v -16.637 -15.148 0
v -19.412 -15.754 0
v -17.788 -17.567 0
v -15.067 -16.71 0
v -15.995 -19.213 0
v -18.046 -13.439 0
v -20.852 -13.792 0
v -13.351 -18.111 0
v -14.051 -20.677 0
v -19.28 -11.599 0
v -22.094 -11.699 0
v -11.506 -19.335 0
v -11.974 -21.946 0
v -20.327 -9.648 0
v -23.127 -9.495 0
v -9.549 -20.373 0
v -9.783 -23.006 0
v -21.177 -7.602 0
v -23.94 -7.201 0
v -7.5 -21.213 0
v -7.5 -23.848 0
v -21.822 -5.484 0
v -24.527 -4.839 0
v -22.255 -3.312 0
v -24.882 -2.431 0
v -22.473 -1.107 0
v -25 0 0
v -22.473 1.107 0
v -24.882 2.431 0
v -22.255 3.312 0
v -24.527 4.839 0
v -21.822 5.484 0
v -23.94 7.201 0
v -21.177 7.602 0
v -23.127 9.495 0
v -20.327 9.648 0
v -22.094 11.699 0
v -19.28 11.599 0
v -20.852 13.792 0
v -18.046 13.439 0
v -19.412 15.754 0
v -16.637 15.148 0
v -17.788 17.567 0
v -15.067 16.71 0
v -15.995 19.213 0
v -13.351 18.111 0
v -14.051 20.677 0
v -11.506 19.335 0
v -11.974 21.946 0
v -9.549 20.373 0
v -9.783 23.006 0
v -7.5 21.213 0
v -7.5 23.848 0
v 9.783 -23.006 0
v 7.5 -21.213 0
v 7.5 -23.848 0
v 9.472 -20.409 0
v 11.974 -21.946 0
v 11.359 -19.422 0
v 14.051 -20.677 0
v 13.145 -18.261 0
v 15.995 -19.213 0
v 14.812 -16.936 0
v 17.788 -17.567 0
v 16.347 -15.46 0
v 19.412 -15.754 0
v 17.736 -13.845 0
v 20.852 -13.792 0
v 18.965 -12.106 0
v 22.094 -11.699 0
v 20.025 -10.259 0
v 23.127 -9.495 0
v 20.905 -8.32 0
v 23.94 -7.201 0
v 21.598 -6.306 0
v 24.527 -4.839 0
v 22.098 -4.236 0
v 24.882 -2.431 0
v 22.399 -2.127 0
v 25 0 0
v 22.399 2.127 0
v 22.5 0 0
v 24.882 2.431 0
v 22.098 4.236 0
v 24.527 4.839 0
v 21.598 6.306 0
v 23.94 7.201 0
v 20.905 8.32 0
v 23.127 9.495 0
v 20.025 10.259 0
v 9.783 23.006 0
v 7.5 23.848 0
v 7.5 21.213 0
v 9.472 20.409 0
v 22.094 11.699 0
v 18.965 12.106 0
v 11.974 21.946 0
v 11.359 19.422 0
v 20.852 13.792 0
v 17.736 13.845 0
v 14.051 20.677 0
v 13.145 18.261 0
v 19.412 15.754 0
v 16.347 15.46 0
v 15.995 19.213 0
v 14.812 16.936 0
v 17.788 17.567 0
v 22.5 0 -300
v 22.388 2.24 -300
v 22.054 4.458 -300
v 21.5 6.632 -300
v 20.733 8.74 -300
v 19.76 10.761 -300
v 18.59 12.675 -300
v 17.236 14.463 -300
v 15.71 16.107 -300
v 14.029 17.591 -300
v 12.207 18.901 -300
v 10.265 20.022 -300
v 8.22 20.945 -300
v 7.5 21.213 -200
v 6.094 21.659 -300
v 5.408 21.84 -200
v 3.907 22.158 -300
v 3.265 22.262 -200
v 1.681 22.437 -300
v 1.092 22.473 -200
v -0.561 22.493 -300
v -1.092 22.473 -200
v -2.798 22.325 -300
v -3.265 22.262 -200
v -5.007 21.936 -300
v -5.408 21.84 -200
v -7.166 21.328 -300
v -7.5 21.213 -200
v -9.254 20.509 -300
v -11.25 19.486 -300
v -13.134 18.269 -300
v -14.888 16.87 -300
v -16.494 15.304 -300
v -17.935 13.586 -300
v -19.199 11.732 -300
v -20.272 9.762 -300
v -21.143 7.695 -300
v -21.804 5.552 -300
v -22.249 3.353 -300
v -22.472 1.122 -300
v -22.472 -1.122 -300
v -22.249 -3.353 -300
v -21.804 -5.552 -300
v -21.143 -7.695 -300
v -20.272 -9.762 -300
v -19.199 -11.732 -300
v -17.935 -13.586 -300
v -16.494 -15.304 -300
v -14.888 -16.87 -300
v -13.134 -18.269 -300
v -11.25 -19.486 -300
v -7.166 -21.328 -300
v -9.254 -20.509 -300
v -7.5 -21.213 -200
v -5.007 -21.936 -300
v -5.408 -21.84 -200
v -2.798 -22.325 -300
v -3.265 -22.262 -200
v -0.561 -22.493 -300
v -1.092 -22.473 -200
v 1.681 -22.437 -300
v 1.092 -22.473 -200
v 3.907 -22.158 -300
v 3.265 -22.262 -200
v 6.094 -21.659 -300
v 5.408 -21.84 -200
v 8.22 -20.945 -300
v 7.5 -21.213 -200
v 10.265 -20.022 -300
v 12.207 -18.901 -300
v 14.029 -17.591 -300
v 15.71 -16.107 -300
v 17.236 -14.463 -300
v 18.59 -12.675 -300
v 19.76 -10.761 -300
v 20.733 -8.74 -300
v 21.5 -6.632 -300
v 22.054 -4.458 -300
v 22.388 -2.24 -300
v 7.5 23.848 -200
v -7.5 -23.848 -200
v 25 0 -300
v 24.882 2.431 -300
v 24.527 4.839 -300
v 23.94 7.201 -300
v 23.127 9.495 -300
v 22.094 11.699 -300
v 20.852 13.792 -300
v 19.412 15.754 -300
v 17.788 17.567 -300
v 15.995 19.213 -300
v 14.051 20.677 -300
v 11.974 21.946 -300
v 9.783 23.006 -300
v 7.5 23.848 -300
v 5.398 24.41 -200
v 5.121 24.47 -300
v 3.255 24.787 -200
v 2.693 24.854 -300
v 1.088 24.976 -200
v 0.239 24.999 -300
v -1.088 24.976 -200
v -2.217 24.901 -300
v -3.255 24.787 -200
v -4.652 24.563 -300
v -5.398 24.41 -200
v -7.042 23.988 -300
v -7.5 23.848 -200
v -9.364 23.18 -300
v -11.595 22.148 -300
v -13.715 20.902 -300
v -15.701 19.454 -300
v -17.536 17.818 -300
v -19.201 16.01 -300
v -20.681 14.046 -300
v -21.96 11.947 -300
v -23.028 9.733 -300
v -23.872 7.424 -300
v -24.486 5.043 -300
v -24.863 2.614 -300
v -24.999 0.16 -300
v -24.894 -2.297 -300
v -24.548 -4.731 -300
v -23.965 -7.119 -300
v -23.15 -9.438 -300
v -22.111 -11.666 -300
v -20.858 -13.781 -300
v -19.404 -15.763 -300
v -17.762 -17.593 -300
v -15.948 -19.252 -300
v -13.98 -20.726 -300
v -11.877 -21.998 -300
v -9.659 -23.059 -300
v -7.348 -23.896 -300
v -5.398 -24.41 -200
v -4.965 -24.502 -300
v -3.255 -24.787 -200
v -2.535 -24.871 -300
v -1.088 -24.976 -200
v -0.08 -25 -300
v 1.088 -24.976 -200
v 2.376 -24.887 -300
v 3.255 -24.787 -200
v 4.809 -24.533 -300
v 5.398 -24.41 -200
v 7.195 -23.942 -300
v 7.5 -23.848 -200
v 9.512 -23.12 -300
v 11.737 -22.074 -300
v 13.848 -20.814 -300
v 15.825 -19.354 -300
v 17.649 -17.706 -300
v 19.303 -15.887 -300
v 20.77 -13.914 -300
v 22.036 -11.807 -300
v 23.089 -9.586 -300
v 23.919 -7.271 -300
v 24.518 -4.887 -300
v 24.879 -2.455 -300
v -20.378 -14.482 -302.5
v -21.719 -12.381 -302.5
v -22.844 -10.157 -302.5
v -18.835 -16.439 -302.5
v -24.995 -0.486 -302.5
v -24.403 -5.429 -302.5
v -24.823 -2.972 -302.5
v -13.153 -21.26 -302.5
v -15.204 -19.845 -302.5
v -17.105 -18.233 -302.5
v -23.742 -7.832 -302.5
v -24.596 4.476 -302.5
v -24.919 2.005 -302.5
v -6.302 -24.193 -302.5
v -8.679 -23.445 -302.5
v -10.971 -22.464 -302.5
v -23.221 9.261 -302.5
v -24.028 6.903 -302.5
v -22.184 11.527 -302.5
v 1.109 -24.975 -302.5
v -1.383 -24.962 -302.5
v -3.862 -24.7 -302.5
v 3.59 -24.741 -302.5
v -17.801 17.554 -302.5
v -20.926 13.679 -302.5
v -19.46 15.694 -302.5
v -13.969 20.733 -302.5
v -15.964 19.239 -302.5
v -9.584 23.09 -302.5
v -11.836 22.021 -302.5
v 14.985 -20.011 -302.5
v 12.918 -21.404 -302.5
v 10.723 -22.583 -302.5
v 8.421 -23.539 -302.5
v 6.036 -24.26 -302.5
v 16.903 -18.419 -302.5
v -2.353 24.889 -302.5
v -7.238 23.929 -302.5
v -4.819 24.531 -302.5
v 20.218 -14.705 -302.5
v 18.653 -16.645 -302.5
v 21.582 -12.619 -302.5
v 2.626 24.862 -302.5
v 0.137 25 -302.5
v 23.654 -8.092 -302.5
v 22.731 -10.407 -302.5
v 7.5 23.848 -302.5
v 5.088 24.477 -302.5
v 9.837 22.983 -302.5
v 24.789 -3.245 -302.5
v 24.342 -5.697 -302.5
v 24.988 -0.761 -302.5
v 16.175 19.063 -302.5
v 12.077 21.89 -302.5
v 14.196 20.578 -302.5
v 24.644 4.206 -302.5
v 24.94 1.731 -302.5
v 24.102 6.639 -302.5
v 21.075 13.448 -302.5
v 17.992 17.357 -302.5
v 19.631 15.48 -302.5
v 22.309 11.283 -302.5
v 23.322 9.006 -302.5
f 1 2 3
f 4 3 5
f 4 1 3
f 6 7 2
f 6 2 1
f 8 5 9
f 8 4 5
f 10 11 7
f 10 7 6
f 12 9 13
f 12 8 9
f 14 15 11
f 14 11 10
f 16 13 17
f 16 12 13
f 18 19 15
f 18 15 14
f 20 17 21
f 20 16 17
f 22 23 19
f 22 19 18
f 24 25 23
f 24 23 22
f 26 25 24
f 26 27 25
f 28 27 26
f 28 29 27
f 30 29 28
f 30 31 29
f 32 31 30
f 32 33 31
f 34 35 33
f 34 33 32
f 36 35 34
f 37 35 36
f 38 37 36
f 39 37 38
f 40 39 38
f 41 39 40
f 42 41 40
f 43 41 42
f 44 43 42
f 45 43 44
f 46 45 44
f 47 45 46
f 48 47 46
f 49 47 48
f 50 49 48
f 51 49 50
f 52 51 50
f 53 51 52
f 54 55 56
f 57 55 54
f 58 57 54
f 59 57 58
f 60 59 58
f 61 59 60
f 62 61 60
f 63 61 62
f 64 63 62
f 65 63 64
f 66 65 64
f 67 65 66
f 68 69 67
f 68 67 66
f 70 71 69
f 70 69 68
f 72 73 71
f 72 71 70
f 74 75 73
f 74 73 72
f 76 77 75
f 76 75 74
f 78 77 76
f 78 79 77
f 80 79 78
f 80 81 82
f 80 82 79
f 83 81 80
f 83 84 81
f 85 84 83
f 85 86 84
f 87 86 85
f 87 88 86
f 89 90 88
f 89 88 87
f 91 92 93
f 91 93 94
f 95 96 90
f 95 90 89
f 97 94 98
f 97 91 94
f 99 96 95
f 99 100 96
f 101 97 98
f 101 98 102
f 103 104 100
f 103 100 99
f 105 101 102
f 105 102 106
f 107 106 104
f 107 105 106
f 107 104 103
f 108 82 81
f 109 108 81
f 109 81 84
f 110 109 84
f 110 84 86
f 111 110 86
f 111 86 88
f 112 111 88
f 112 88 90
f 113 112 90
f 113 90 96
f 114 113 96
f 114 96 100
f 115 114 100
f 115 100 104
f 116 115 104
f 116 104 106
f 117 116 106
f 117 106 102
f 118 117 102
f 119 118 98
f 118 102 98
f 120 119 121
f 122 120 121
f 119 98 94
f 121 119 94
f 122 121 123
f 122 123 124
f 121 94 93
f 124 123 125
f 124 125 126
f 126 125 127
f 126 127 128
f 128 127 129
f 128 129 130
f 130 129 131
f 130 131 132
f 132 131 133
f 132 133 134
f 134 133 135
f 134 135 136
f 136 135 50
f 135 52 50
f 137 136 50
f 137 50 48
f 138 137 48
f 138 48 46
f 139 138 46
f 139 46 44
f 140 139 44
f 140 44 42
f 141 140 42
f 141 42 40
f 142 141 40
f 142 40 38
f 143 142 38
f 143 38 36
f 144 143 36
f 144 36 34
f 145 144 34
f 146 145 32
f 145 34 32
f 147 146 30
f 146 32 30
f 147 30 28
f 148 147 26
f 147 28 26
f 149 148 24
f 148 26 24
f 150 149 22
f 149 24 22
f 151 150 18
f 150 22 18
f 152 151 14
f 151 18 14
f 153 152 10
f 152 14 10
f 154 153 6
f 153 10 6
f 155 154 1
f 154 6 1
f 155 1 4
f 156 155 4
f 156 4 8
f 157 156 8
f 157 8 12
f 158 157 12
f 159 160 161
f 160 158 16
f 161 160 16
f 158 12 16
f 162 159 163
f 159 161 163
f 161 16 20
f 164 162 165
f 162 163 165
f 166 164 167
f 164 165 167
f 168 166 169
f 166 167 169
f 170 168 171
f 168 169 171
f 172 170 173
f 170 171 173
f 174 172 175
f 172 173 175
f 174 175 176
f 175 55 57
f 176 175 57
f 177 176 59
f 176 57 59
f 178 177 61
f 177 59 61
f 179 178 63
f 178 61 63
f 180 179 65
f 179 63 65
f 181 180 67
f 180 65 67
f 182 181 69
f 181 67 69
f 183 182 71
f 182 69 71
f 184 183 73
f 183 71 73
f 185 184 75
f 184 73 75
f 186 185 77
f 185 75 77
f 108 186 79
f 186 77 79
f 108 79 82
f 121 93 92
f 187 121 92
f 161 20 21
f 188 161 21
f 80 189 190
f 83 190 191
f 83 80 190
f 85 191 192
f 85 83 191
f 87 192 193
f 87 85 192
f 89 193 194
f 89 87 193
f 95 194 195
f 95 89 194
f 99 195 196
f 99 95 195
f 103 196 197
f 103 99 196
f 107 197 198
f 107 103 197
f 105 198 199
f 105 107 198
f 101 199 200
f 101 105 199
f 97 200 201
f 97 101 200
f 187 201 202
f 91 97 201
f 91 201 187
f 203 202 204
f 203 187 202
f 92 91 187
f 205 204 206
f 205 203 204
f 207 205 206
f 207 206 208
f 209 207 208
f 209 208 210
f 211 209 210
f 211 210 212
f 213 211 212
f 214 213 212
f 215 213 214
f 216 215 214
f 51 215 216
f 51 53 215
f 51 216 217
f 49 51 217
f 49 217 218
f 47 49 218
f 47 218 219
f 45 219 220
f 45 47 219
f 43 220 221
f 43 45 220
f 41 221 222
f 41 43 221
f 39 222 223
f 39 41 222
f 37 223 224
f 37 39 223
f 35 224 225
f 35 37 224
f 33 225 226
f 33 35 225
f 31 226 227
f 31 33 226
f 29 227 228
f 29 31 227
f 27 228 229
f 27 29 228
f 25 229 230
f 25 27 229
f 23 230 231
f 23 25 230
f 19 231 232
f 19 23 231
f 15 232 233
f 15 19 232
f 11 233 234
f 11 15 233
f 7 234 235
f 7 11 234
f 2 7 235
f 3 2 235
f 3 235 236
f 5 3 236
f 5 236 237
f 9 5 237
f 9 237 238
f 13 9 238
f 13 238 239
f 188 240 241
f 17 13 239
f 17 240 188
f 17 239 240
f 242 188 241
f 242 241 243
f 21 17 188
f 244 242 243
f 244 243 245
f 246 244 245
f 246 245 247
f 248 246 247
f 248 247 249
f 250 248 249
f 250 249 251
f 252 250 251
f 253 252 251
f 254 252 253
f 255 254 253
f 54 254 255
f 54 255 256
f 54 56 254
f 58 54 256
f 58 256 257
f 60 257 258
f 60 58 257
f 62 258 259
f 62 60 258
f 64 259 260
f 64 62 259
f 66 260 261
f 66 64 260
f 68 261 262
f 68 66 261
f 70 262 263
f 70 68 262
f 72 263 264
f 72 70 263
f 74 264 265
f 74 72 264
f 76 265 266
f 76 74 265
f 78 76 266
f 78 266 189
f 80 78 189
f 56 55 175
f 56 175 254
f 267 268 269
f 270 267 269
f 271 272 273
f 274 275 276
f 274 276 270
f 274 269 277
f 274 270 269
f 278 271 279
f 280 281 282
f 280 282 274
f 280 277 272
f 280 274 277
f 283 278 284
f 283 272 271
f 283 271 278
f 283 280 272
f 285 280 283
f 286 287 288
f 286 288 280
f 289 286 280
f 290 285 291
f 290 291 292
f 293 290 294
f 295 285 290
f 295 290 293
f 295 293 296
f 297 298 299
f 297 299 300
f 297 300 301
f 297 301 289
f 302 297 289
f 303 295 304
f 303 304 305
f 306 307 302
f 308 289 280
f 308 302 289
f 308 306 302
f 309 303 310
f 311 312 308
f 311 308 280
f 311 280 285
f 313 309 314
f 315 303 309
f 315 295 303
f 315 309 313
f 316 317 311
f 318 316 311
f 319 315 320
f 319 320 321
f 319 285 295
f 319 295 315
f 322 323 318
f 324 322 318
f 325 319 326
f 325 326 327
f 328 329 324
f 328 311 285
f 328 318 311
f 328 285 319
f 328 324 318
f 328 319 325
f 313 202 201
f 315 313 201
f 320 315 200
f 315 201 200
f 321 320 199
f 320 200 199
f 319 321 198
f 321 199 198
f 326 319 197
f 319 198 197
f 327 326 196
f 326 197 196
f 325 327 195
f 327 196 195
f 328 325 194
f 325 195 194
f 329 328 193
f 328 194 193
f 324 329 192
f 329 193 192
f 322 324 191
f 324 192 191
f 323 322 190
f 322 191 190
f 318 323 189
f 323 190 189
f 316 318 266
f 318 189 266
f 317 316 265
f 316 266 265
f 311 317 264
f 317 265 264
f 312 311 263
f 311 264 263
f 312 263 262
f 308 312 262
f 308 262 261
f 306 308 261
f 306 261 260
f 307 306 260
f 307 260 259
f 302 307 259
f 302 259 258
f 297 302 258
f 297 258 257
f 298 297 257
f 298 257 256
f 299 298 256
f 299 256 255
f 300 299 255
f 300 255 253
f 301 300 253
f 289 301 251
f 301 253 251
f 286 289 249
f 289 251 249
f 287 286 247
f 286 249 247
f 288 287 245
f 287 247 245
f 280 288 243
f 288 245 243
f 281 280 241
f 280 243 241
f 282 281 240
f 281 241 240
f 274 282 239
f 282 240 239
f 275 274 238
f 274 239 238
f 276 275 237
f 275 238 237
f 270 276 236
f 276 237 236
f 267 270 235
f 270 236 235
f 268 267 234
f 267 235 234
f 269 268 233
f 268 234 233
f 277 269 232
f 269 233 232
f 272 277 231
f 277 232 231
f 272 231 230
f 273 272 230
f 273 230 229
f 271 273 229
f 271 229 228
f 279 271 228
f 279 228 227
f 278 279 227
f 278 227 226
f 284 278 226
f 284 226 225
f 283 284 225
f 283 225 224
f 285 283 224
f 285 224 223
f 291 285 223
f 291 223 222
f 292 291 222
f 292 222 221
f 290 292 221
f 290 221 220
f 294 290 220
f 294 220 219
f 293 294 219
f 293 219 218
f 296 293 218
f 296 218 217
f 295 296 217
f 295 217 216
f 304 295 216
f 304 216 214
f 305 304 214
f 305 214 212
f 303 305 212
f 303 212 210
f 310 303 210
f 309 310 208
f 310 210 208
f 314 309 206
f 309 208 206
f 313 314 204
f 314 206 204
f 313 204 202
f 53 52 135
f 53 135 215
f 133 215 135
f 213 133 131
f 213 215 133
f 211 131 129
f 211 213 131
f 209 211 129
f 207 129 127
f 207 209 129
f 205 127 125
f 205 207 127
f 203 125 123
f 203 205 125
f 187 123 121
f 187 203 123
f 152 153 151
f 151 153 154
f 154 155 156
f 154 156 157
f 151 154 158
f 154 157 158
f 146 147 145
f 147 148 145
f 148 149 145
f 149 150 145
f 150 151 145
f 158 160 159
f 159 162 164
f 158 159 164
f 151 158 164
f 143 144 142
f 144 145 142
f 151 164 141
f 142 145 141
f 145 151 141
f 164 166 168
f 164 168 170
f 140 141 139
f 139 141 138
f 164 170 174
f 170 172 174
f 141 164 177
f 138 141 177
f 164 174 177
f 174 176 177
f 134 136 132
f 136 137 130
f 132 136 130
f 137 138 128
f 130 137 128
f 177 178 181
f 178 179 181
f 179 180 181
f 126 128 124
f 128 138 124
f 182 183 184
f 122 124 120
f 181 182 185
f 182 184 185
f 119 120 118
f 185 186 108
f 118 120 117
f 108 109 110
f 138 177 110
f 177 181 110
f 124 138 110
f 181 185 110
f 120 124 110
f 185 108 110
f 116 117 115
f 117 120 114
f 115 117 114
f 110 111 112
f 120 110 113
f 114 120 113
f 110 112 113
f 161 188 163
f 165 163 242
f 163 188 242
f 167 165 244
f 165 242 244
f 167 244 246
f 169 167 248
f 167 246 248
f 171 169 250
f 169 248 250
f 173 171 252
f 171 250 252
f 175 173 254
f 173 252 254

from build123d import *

# Parameters (mm, degrees)
SKETCH1_R           = 25
SKETCH1_R_2         = 22.5
BOSS_EXTRUDE1_DEPTH = 300
SKETCH2_W           = 15
SKETCH2_H           = 7.280738242
CUT_EXTRUDE1_DEPTH  = 200
SKETCH3_R           = 25
BOSS_EXTRUDE2_DEPTH = 2.5


with BuildPart() as part:
    # Sketch1 → Boss-Extrude1 (new body)
    with BuildSketch(Plane.XY):
        Circle(SKETCH1_R)
        Circle(SKETCH1_R_2, mode=Mode.SUBTRACT)
    extrude(amount=-BOSS_EXTRUDE1_DEPTH)

    # Sketch2 → Cut-Extrude1 (cut)
    with BuildSketch(Plane.XY):
        with Locations((0, 23)):
            Rectangle(SKETCH2_W, SKETCH2_H)
    cut_extrude1 = extrude(amount=-CUT_EXTRUDE1_DEPTH, mode=Mode.SUBTRACT)

    # Mirror1: Cut-Extrude1 across plane
    add(cut_extrude1.mirror(Plane.ZX), mode=Mode.SUBTRACT)

    # Sketch3 → Boss-Extrude2 (add)
    with BuildSketch(Plane(origin=(0, 0, -300), x_dir=(-1, 0, 0), z_dir=(0, 0, -1))):
        with Locations(Location((0, 0, 0), (0, 0, 107.457603124))):
            Circle(SKETCH3_R)
    extrude(amount=BOSS_EXTRUDE2_DEPTH)


solid = part.part
